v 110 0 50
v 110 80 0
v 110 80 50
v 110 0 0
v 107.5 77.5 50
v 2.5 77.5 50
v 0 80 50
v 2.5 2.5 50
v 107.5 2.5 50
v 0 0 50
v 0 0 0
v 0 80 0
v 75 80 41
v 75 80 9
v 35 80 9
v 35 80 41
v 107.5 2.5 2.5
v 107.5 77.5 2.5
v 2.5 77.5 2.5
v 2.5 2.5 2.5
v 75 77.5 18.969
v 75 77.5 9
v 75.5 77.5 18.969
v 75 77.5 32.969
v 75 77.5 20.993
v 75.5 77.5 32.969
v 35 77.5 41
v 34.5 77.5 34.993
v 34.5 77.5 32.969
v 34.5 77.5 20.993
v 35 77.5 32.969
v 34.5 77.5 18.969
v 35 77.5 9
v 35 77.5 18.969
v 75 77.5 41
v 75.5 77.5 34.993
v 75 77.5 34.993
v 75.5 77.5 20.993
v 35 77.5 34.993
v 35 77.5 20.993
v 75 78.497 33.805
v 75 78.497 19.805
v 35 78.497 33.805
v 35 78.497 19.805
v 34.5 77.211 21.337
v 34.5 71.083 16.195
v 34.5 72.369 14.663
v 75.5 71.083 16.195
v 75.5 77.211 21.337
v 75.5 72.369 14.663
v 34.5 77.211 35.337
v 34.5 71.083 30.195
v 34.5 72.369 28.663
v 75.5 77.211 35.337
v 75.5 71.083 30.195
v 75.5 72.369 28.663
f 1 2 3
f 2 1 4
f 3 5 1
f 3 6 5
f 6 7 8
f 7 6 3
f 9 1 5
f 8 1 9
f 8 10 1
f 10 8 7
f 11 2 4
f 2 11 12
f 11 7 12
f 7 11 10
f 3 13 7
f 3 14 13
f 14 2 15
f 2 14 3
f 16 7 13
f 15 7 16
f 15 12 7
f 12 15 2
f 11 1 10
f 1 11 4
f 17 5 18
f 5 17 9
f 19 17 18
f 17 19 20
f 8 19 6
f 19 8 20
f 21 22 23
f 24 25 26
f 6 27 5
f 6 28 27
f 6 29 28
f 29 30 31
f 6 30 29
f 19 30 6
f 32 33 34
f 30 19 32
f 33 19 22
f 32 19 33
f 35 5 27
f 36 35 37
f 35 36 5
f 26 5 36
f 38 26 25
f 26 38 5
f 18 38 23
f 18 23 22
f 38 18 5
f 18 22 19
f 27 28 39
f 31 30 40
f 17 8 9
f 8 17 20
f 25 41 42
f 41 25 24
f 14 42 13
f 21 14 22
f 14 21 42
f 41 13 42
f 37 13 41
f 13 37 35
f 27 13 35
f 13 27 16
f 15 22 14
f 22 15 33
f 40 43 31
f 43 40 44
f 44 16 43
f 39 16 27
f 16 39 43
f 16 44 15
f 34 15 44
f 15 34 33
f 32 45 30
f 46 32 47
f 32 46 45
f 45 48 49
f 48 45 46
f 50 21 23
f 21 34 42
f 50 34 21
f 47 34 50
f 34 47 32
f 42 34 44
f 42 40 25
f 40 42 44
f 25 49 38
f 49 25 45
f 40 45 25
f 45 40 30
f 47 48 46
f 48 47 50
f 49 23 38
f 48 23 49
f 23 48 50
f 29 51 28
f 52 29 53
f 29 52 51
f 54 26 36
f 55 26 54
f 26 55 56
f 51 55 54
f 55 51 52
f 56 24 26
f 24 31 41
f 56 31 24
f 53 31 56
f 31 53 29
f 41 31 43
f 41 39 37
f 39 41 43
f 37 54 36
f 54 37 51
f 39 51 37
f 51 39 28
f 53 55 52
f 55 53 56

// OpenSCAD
$fn = 32;

// ----------------------------------------------------------------------
// Vent box: louvers enclosure
// ----------------------------------------------------------------------

// --- parameters (mm) ---
box_l = 110;              // box length, X
box_w = 80;               // box width, Y
box_h = 50;               // box height, Z
wall_t = 2.5;             // shell wall thickness
win_l = 40;               // vent window width, X
win_h = 32;               // vent window height, Z
slat_t = 2;               // louver slat thickness
slat_d = 8;               // louver slat depth
slat_a = 40;              // louver slat angle, degrees
slat_pitch = 14;          // louver pitch
slat_yc = 74.79;          // slat centreline Y

win_z0 = (box_h - win_h) / 2;  // window lower edge Z
n_slats = 2;  // louver count
slat_z0 = win_z0 + (win_h - (n_slats - 1) * slat_pitch) / 2;

difference() {
  union() {
    difference() {
      cube([box_l, box_w, box_h]);
  translate([wall_t, wall_t, wall_t])
    cube([box_l - 2 * wall_t, box_w - 2 * wall_t, box_h]);
  translate([(box_l - win_l) / 2, box_w - wall_t - 1, win_z0])
    cube([win_l, wall_t + 2, win_h]);
    }
    for (i = [0 : n_slats - 1])
      translate([box_l / 2, slat_yc, slat_z0 + i * slat_pitch])
        rotate([slat_a, 0, 0])
          cube([win_l + 1, slat_d, slat_t], center = true);
  }
}
